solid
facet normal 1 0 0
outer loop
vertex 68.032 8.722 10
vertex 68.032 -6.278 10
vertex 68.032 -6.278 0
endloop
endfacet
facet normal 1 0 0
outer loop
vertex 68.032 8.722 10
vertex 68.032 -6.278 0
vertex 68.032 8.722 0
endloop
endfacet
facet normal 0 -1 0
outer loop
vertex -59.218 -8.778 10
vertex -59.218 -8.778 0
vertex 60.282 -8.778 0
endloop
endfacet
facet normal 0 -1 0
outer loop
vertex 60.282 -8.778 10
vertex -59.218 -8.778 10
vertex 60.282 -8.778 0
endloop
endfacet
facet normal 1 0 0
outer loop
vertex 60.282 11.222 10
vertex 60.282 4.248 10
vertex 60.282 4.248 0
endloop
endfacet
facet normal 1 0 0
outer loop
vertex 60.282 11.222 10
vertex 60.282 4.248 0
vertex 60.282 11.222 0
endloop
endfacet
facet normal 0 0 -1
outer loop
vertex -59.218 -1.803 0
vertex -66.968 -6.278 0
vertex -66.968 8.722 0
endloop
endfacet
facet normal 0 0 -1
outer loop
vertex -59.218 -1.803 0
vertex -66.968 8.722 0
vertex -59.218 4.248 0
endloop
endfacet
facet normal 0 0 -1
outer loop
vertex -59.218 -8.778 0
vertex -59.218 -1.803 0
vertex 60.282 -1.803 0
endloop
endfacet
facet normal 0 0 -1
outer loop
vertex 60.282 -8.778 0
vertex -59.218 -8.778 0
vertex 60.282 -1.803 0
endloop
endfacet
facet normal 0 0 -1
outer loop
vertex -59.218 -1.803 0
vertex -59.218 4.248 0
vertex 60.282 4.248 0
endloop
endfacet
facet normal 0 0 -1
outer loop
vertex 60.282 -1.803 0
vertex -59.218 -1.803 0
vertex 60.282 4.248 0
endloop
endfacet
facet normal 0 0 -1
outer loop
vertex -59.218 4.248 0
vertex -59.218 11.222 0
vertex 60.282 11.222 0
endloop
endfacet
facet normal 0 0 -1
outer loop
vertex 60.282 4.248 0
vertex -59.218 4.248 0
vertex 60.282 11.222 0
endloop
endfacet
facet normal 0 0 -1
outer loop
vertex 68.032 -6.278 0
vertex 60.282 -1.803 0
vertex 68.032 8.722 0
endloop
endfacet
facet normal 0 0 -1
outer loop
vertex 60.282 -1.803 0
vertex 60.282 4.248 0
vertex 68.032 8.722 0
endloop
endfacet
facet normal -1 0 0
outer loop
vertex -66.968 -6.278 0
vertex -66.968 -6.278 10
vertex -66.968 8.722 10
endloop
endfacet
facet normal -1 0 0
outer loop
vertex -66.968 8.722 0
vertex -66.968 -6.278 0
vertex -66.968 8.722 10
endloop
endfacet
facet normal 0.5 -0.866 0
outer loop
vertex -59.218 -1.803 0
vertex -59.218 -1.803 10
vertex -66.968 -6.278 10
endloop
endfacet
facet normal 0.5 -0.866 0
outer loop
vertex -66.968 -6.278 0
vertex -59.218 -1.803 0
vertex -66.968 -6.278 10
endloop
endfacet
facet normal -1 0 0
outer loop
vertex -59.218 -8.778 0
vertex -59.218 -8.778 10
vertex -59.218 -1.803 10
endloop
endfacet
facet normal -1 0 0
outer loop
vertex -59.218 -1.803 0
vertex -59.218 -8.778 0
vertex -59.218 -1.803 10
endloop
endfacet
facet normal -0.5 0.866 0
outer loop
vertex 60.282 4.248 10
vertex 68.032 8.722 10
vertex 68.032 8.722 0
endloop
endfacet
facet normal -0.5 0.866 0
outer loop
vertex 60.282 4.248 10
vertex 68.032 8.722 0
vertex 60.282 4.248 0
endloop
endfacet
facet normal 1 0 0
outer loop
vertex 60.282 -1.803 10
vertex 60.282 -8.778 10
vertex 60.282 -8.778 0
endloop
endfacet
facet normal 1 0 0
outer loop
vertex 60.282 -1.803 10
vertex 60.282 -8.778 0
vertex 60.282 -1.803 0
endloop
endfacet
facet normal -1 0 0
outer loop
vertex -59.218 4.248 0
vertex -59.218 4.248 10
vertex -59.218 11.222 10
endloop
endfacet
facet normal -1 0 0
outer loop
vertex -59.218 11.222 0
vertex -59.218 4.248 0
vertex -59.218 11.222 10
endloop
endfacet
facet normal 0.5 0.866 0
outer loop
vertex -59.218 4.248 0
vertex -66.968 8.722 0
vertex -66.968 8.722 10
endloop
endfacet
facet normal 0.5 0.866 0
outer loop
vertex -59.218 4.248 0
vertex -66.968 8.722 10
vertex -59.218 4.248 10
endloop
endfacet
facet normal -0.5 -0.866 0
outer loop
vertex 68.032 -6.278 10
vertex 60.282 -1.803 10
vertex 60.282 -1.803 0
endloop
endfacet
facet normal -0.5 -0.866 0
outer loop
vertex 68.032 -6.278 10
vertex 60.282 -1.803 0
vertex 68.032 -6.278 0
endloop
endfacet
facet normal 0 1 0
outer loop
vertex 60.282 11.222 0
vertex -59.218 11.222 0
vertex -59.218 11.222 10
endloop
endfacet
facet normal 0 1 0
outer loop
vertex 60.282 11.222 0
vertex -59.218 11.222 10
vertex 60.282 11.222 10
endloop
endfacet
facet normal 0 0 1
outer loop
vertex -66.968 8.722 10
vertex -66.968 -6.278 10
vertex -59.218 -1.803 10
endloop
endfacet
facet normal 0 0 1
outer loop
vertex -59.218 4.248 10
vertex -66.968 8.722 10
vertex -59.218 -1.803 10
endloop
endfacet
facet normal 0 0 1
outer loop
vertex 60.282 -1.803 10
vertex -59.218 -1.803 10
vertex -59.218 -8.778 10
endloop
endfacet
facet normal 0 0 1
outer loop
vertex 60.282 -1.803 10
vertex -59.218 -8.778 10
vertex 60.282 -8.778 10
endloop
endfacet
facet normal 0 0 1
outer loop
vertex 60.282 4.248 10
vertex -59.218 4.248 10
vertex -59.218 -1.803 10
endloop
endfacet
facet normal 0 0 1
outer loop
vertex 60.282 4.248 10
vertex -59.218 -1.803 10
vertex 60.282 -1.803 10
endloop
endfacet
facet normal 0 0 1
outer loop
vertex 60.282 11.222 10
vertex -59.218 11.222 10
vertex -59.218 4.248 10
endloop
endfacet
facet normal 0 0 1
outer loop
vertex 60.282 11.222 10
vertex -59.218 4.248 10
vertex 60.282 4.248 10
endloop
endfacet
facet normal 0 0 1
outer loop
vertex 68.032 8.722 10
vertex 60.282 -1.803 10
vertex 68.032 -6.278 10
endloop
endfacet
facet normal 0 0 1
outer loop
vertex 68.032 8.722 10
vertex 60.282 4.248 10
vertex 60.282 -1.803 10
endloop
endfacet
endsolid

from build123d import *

# Parameters (mm, degrees)
SKETCH_W     = 135
SKETCH_H     = 20
PAD_DEPTH    = 10
POCKET_DEPTH = 10


with BuildPart() as part:
    # Sketch → Pad (new body)
    with BuildSketch(Plane.XY):
        with Locations((0.531994, 1.222491)):
            Rectangle(SKETCH_W, SKETCH_H)
    extrude(amount=PAD_DEPTH)

    # Sketch001 (on Face6 of Pad) → Pocket (cut)
    with BuildSketch(Plane.XY.offset(10)):
        Polygon((-66.968006, 8.722491), (-59.218006, 4.248027), (-59.218006, 16.222491), (-71.968006, 16.222491), (-71.968006, -13.777509), (-59.218006, -13.777509), (-59.218006, -1.803044), (-66.968006, -6.277509), align=None)
        Polygon((68.031994, 8.722491), (60.281994, 4.248027), (60.281994, 16.222491), (73.031994, 16.222491), (73.031994, -13.777509), (60.281994, -13.777509), (60.281994, -1.803044), (68.031994, -6.277509), align=None)
    extrude(amount=-POCKET_DEPTH, mode=Mode.SUBTRACT)


solid = part.part
